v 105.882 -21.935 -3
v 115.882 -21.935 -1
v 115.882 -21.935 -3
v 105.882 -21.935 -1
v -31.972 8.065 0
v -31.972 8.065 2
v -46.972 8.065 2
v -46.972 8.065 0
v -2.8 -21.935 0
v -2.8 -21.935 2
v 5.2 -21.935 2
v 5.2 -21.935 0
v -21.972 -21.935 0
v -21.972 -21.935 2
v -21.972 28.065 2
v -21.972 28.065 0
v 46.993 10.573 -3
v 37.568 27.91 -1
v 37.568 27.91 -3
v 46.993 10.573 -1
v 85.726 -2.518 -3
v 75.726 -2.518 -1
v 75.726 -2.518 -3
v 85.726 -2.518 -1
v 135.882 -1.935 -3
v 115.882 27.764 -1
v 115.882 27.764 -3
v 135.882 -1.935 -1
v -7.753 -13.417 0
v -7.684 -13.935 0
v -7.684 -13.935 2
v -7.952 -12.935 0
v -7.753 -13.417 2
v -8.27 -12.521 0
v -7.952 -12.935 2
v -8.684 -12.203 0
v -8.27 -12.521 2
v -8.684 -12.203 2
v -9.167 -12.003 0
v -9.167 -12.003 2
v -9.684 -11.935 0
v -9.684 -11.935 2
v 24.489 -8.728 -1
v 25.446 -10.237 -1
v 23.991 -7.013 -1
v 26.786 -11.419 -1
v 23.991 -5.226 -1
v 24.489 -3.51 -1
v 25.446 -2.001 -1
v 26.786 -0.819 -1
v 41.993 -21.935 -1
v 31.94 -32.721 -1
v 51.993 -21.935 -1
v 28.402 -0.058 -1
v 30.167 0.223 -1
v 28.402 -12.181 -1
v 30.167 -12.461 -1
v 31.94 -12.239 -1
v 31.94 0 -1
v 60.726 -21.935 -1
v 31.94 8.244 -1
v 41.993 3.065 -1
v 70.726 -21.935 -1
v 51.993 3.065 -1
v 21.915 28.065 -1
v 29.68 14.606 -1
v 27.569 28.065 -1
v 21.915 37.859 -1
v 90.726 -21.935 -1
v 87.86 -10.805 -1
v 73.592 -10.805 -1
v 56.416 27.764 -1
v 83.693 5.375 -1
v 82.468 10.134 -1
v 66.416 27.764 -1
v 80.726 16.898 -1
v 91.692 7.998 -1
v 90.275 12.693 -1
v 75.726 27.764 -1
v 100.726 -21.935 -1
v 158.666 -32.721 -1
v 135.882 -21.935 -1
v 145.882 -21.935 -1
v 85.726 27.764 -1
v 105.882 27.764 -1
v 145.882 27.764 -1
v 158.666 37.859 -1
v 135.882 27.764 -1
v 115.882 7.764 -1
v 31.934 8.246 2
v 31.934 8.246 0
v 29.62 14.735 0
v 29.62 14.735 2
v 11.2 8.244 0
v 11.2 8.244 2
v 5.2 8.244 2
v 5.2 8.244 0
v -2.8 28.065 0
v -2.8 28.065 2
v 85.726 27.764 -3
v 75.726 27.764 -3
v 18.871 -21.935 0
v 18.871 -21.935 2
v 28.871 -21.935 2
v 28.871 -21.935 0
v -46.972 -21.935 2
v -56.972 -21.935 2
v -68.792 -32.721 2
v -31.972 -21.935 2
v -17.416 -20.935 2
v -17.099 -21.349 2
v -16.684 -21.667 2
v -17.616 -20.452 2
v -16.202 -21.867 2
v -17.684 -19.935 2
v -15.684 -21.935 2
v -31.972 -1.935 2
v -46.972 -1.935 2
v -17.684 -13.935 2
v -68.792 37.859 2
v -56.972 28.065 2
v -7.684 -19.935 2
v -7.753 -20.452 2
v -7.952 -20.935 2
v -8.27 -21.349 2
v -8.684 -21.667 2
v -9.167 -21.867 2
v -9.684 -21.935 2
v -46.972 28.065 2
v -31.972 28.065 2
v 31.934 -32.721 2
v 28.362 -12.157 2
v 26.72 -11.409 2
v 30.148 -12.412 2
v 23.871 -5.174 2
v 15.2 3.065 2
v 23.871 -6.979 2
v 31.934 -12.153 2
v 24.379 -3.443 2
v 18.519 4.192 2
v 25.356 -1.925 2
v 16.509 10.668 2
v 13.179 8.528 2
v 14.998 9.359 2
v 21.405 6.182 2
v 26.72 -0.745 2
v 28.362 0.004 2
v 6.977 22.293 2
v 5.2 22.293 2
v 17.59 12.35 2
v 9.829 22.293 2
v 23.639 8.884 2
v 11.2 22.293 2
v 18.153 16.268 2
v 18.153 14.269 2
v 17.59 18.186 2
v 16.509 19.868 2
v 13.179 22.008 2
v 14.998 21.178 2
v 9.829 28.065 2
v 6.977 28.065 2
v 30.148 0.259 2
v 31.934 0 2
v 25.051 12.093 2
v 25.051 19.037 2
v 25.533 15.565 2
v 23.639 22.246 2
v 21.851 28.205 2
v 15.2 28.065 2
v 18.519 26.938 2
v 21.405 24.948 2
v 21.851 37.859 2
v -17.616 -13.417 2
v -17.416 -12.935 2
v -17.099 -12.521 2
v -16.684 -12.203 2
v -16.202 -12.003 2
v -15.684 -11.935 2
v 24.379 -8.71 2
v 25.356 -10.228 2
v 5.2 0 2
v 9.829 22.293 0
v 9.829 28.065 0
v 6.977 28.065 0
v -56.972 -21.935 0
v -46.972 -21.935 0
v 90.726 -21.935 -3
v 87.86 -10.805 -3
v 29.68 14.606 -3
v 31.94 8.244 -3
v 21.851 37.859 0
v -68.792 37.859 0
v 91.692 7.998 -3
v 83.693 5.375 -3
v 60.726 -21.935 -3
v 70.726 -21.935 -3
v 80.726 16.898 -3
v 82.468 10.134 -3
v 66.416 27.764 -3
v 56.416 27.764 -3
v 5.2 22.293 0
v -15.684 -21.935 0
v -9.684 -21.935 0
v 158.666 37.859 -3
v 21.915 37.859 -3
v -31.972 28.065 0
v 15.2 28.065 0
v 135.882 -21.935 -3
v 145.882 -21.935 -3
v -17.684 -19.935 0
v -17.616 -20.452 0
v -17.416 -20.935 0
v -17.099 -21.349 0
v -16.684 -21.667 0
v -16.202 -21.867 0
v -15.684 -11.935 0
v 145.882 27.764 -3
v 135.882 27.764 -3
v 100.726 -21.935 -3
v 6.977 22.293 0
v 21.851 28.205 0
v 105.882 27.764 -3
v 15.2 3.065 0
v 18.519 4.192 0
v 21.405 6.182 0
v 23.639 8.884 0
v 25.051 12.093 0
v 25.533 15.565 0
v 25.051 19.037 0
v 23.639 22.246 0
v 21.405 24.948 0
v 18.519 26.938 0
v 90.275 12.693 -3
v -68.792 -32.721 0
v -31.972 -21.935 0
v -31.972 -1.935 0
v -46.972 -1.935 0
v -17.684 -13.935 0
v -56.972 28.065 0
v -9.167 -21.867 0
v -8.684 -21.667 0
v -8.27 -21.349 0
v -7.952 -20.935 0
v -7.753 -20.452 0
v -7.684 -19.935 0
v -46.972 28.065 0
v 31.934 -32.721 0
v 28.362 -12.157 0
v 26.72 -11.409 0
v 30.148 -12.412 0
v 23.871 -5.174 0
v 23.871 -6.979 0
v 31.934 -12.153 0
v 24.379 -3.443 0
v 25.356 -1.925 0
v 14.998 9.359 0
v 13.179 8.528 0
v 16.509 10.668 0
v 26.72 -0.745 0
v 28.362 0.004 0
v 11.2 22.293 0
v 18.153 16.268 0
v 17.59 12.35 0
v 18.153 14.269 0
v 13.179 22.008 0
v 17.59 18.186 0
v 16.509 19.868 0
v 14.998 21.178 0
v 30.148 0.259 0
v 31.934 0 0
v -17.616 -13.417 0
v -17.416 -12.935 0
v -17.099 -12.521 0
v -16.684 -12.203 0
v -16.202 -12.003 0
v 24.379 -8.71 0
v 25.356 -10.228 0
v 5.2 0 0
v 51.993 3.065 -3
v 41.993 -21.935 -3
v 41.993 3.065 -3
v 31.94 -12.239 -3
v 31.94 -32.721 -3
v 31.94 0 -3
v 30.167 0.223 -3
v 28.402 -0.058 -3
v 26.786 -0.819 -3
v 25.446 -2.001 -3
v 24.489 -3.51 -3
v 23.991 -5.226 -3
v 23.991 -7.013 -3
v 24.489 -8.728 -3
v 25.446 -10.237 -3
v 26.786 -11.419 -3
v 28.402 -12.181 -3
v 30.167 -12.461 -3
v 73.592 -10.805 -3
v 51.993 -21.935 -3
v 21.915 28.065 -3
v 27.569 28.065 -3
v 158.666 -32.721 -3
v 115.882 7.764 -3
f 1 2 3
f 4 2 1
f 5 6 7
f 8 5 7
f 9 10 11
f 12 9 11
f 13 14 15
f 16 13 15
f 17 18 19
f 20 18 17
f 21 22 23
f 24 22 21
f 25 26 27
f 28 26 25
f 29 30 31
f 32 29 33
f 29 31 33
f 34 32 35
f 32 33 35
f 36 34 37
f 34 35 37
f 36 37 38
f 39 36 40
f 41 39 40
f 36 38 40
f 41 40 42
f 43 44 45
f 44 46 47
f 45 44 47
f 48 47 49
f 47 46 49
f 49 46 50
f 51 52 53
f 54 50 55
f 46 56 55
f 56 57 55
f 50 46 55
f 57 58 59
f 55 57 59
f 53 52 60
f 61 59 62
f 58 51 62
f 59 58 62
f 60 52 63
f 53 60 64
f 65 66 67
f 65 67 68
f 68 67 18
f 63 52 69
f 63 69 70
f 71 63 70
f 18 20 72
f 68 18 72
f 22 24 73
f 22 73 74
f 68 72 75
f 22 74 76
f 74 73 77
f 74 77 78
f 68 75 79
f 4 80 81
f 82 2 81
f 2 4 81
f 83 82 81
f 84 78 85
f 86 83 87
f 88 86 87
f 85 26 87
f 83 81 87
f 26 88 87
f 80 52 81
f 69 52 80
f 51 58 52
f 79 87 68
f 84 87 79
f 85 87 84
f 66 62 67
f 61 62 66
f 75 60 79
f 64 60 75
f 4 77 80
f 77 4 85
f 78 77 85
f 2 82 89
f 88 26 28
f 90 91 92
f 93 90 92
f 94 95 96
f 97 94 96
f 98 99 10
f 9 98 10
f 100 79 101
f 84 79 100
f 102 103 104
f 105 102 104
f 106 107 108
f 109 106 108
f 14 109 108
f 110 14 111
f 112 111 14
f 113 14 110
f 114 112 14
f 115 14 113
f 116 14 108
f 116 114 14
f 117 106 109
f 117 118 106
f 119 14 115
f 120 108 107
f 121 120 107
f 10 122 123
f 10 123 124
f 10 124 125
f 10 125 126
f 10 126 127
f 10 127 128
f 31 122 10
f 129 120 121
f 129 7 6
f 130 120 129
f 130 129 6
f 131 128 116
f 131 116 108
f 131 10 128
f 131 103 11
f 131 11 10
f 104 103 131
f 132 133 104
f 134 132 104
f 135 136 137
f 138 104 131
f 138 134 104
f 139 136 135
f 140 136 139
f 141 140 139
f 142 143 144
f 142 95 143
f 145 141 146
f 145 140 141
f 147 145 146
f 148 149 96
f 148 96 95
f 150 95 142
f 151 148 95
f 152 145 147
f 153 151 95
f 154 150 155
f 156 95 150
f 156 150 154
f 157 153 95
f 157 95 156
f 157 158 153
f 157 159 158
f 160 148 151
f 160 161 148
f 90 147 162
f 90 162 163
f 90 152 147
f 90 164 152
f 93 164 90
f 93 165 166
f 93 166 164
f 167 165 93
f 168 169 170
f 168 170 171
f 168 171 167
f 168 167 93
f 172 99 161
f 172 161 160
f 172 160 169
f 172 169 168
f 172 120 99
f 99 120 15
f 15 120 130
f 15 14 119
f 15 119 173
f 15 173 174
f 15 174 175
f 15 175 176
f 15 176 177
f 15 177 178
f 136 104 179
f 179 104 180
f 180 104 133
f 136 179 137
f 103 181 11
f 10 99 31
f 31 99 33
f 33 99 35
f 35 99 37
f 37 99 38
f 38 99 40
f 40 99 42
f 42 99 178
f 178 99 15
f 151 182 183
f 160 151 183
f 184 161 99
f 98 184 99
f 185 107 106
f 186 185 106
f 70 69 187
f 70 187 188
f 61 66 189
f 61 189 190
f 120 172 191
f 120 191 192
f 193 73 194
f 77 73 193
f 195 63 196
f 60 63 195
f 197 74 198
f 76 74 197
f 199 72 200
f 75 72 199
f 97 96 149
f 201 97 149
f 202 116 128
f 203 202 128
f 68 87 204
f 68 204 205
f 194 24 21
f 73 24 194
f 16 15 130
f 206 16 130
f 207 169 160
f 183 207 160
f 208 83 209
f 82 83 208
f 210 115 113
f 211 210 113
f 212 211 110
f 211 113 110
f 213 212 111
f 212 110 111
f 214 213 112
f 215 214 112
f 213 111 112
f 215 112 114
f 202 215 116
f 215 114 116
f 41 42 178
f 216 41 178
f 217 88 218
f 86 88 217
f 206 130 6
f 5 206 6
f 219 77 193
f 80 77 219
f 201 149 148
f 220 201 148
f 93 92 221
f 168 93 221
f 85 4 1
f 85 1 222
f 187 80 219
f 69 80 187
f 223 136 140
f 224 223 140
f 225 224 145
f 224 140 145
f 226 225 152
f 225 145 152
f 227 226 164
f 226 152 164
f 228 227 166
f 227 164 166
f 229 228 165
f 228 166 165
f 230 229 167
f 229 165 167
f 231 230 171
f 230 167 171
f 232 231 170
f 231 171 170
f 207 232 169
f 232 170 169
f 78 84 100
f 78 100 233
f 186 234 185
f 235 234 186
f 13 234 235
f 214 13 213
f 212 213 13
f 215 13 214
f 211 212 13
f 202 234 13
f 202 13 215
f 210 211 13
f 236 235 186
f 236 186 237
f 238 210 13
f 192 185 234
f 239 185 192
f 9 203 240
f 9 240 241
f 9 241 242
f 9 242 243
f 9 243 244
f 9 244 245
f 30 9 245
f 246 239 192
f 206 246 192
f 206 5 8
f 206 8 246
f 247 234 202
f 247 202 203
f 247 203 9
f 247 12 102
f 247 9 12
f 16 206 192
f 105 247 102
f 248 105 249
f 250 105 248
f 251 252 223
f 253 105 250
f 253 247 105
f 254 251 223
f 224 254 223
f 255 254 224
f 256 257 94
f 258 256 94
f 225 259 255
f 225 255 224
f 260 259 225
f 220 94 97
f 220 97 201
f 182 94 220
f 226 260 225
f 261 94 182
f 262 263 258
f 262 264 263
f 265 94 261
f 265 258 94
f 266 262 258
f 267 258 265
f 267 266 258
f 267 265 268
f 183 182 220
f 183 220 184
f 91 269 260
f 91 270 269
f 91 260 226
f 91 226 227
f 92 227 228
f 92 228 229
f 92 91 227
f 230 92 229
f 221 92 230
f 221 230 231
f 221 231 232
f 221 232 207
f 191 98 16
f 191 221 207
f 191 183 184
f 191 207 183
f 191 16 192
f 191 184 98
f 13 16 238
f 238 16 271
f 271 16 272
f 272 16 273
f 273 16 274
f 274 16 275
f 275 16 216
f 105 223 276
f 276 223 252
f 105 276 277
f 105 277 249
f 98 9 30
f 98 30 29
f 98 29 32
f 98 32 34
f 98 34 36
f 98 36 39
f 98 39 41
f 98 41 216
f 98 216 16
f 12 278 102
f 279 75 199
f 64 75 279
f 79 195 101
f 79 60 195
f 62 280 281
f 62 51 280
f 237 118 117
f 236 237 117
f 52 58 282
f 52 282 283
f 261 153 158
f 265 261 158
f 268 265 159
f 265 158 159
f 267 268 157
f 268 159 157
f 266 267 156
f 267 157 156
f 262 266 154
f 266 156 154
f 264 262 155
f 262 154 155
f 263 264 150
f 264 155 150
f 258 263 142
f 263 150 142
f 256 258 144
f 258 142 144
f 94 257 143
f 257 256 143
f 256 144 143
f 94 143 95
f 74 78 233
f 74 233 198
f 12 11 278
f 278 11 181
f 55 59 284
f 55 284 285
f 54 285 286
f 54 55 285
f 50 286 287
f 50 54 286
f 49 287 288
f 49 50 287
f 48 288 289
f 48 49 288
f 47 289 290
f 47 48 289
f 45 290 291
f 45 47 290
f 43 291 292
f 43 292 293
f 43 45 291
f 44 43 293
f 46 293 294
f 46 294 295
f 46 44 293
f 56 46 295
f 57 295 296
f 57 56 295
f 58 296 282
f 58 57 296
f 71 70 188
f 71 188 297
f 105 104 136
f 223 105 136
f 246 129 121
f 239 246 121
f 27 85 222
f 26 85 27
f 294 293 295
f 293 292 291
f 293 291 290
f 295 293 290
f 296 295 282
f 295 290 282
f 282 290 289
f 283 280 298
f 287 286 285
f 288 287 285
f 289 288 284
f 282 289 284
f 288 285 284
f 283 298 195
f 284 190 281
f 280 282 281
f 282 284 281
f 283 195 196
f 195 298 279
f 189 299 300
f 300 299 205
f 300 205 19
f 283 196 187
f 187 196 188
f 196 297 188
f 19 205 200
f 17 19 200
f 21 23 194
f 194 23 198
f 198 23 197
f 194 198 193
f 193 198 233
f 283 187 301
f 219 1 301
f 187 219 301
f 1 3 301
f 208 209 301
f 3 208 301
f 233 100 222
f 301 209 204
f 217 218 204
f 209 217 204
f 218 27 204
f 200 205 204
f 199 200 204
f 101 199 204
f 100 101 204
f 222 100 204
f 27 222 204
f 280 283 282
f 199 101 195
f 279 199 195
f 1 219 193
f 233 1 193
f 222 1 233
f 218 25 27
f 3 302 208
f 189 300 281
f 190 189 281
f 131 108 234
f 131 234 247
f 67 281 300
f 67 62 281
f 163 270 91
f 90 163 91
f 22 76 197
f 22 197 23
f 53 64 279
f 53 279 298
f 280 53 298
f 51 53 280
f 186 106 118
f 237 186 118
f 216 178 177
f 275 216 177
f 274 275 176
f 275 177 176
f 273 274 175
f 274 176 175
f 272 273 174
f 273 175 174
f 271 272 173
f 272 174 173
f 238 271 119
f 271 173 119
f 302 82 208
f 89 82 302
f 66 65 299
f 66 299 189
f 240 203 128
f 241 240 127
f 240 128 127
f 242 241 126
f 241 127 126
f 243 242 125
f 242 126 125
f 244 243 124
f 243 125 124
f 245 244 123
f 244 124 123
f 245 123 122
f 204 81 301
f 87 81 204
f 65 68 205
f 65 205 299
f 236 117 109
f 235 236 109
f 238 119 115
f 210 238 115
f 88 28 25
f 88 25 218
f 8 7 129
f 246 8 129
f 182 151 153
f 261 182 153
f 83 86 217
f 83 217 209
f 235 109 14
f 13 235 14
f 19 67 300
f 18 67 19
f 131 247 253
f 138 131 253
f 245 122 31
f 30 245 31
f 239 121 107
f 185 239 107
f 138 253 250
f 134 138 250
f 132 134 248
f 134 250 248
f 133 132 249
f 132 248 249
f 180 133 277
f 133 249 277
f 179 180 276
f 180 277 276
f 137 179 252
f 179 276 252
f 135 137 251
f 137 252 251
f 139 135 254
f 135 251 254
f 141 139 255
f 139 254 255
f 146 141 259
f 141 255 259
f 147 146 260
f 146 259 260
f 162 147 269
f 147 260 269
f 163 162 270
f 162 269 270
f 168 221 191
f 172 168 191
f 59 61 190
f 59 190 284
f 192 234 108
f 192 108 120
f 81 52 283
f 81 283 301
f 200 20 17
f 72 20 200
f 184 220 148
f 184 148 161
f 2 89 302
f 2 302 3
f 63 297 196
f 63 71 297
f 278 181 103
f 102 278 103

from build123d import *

# Parameters (mm, degrees)
F1_DEPTH  = 25
F4_W      = 227.4575755
F4_H      = 70.5800577998
F5_DEPTH  = 20
F6_DEPTH  = 60.1
F7_W      = 2.8521483764
F7_H      = 8.2712303847
F8_DEPTH  = 20
F9_DEPTH  = 18
F11_DEPTH = 5
F12_W     = 70.5800577998
F12_H     = 1
F13_DEPTH = 150.9
F15_DEPTH = 25


with BuildPart() as f1:
    # F0 (on Top) → F1 (new body)
    with BuildSketch(Plane.XY):
        Polygon((-46.9723631442, 28.0651573092), (-56.9723631442, 28.0651573092), (-56.9723631442, -21.9348426908), (-46.9723631442, -21.9348426908), (-46.9723631442, -1.9348426908), (-31.9723631442, -1.9348426908), (-31.9723631442, -21.9348426908), (-21.9723631442, -21.9348426908), (-21.9723631442, 28.0651573092), (-31.9723631442, 28.0651573092), (-31.9723631442, 8.0651573092), (-46.9723631442, 8.0651573092), align=None)
    extrude(amount=F1_DEPTH)



with BuildPart() as f1b:
    # F0 (on Top) → F1, piece 2 (new body)
    with BuildSketch(Plane.XY):
        with BuildLine():
            Line((10, 28.0651573092), (0, 28.0651573092))
            Line((0, 28.0651573092), (0, -21.9348426908))
            Line((0, -21.9348426908), (8, -21.9348426908))
            Line((8, -21.9348426908), (8, 0))
            Line((8, 0), (21.6713771224, -21.9348426908))
            Line((21.6713771224, -21.9348426908), (31.6713771224, -21.9348426908))
            Line((31.6713771224, -21.9348426908), (18, 3.0651573092))
            ThreePointArc((18, 3.0651573092), (28.3333292247, 15.5651573092), (18, 28.0651573092))
            Line((18, 28.0651573092), (10, 28.0651573092))
        make_face()
        with BuildLine():
            Line((14, 8.2439472899), (8, 8.2439472899))
            Line((8, 8.2439472899), (8, 22.2926959395))
            Line((8, 22.2926959395), (14, 22.2926959395))
            ThreePointArc((14, 22.2926959395), (21.0243743248, 15.2683216147), (14, 8.2439472899))
        make_face(mode=Mode.SUBTRACT)
    extrude(amount=F1_DEPTH)


with BuildPart() as f1c:
    # F0 (on Top) → F1, piece 3 (new body)
    with BuildSketch(Plane.XY):
        with BuildLine():
            ThreePointArc((-17.6843942031, -19.9348426908), (-17.0986077655, -21.3490562532), (-15.6843942031, -21.9348426908))
            Line((-15.6843942031, -21.9348426908), (-9.6843942031, -21.9348426908))
            ThreePointArc((-9.6843942031, -21.9348426908), (-8.2701806408, -21.3490562532), (-7.6843942031, -19.9348426908))
            Line((-7.6843942031, -19.9348426908), (-7.6843942031, -13.9348426908))
            ThreePointArc((-7.6843942031, -13.9348426908), (-8.2701806408, -12.5206291285), (-9.6843942031, -11.9348426908))
            Line((-9.6843942031, -11.9348426908), (-15.6843942031, -11.9348426908))
            ThreePointArc((-15.6843942031, -11.9348426908), (-17.0986077655, -12.5206291285), (-17.6843942031, -13.9348426908))
            Line((-17.6843942031, -13.9348426908), (-17.6843942031, -19.9348426908))
        make_face()
    extrude(amount=F1_DEPTH)


with BuildPart() as f1d:
    # F0 (on Top) → F1, piece 4 (new body)
    with BuildSketch(Plane.XY):
        Polygon((44.7931885719, 3.0651573092), (44.7931885719, -21.9348426908), (54.7931885719, -21.9348426908), (54.7931885719, 3.0651573092), (69.2160581468, 27.764311542), (59.2160581468, 27.764311542), (49.7931885719, 10.5728954077), (40.3677413874, 27.9102737799), (30.3689409047, 28.0651573092), align=None)
    extrude(amount=F1_DEPTH)


with BuildPart() as f1e:
    # F0 (on Top) → F1, piece 5 (new body)
    with BuildSketch(Plane.XY):
        Polygon((86.8261525035, 27.764311542), (71.8261525035, -21.9348426908), (81.8261525035, -21.9348426908), (84.6922499531, -10.8048464541), (98.9600550539, -10.8048464541), (101.8261525035, -21.9348426908), (111.8261525035, -21.9348426908), (96.8261525035, 27.764311542), (91.8261525035, 27.764311542), align=None)
        Polygon((86.8261525035, -2.5182031095), (91.8261525035, 16.8984364718), (96.8261525035, -2.5182031095), align=None, mode=Mode.SUBTRACT)
    extrude(amount=F1_DEPTH)


with BuildPart() as f1f:
    # F0 (on Top) → F1, piece 6 (new body)
    with BuildSketch(Plane.XY):
        Polygon((116.9819906354, 27.764311542), (116.9819906354, -21.9348426908), (126.9819906354, -21.9348426908), (126.9819906354, 7.764311542), (146.9819906354, -21.9348426908), (156.9819906354, -21.9348426908), (156.9819906354, 27.764311542), (146.9819906354, 27.764311542), (146.9819906354, -1.9348426908), (126.9819906354, 27.764311542), align=None)
    extrude(amount=F1_DEPTH)


with BuildPart() as f1e_1:
    # F2: moved
    add(f1e.part.moved(Location((-8.3, 0, 0))))


with BuildPart() as f1f_1:
    # F2: moved
    add(f1f.part.moved(Location((-8.3, 0, 0))))


with BuildPart() as f1d_1:
    # F3: moved
    add(f1d.part.moved(Location((-2.8, 0, 0))))


with BuildPart() as f1e_2:
    # F3: moved
    add(f1e_1.part.moved(Location((-2.8, 0, 0))))


with BuildPart() as f1f_2:
    # F3: moved
    add(f1f_1.part.moved(Location((-2.8, 0, 0))))


with BuildPart() as f1b_1:
    # F3: moved
    add(f1b.part.moved(Location((-2.8, 0, 0))))


with BuildPart() as f1_1:
    add(f1.part)

    add(f1b_1.part)  # F5 merges F1b

    add(f1c.part)  # F5 merges F1c

    add(f1d_1.part)  # F5 merges F1d

    add(f1e_2.part)  # F5 merges F1e

    add(f1f_2.part)  # F5 merges F1f
    # F4 (on Top) → F5 (join)
    with BuildSketch(Plane.XY):
        with Locations((44.937197119, 2.5689788163)):
            Rectangle(F4_W, F4_H)
    extrude(amount=F5_DEPTH)

    # F6 (cut): faces of the model
    f6_faces = [f1_1.faces().sort_by_distance(p)[0] for p in [
        (-39.4723631442, 3.0651573092, 25),
        (-12.6843942031, -16.9348426908, 25),
        (9.9555053028, 3.3304867819, 25),
        (46.9841841079, 7.0402084127, 25),
        (68.8369069767, 2.7303989527, 25),
        (125.8819906354, 2.9147344256, 25),
    ]]
    extrude(f6_faces, amount=-F6_DEPTH, mode=Mode.SUBTRACT)

    # F7 (on Top) → F8 (join)
    with BuildSketch(Plane.XY):
        with Locations((8.402756881, 25.4406826571)):
            Rectangle(F7_W, F7_H)
        Polygon((92.340439558, 13.3704673499), (81.9505527616, 9.963946417), (82.3234398778, 4.9261620448), (93.8680427637, 8.7112784915), align=None)
    extrude(amount=F8_DEPTH)

    # F9 (cut): a face of the model
    f9_faces = [f1_1.faces().sort_by_distance(p)[0] for p in [
        (44.937197119, 35.4774432469, 20),
    ]]
    extrude(f9_faces, amount=-F9_DEPTH, mode=Mode.SUBTRACT)

    # F10 (on face) → F11 (join)
    with BuildSketch(Plane.XY.offset(2)):
        with BuildLine():
            Line((158.665984869, 37.8590077162), (21.9146478921, 37.8590077162))
            Line((21.9146478921, 37.8590077162), (21.9146478921, 28.0651573092))
            Line((21.9146478921, 28.0651573092), (29.6798946739, 14.6064886823))
            Line((29.6798946739, 14.6064886823), (31.9397747517, 8.2439472899))
            Line((31.9397747517, 8.2439472899), (31.9397747517, 0))
            ThreePointArc((31.9397747517, 0), (23.9279042936, -6.1192756984), (31.9397747517, -12.2385513969))
            Line((31.9397747517, -12.2385513969), (31.9397747517, -32.7210500836))
            Line((31.9397747517, -32.7210500836), (158.665984869, -32.7210500836))
            Line((158.665984869, -32.7210500836), (158.665984869, 37.8590077162))
        make_face()
        Polygon((41.9931885719, -21.9348426908), (41.9931885719, 3.0651573092), (27.5689409047, 28.0651573092), (37.5677413874, 27.9102737799), (46.9931885719, 10.5728954077), (56.4160581468, 27.764311542), (66.4160581468, 27.764311542), (51.9931885719, 3.0651573092), (51.9931885719, -21.9348426908), align=None, mode=Mode.SUBTRACT)
        Polygon((70.7261525035, -21.9348426908), (60.7261525035, -21.9348426908), (75.7261525035, 27.764311542), (85.7261525035, 27.764311542), (90.2748478691, 12.6932240396), (82.4681591424, 10.1336534606), (80.7261525035, 16.8984364718), (75.7261525035, -2.5182031095), (85.7261525035, -2.5182031095), (83.6934740995, 5.3753536815), (91.6919958377, 7.9978203423), (100.7261525035, -21.9348426908), (90.7261525035, -21.9348426908), (87.8600550539, -10.8048464541), (73.5922499531, -10.8048464541), align=None, mode=Mode.SUBTRACT)
        Polygon((105.8819906354, -21.9348426908), (105.8819906354, 27.764311542), (115.8819906354, 27.764311542), (135.8819906354, -1.9348426908), (135.8819906354, 27.764311542), (145.8819906354, 27.764311542), (145.8819906354, -21.9348426908), (135.8819906354, -21.9348426908), (115.8819906354, 7.764311542), (115.8819906354, -21.9348426908), align=None, mode=Mode.SUBTRACT)
    extrude(amount=-F11_DEPTH)

    # F12 (on face) → F13 (cut)
    with BuildSketch(Plane.YZ.offset(158.665984869)):
        with Locations((2.5689788163, -0.5)):
            Rectangle(F12_W, F12_H)
    extrude(amount=-F13_DEPTH, mode=Mode.SUBTRACT)

    # F14 (on face) → F15 (cut)
    with BuildSketch(Plane(origin=(0, 0, 0), x_dir=(1, 0, 0), z_dir=(0, 0, -1))):
        with BuildLine():
            Line((21.8506939709, -28.2046720386), (21.8506939709, -37.8590077162))
            Line((21.8506939709, -37.8590077162), (158.665984869, -37.8590077162))
            Line((158.665984869, -37.8590077162), (158.665984869, 32.7210500836))
            Line((158.665984869, 32.7210500836), (31.9340899587, 32.7210500836))
            Line((31.9340899587, 32.7210500836), (31.9340899587, 12.1531756595))
            ThreePointArc((31.9340899587, 12.1531756595), (23.8061123839, 6.0765878297), (31.9340899587, 0))
            Line((31.9340899587, 0), (31.9340899587, -8.246445097))
            Line((31.9340899587, -8.246445097), (29.6203736216, -14.7349052131))
            Line((29.6203736216, -14.7349052131), (21.8506939709, -28.2046720386))
        make_face()
        Polygon((41.9931885719, -3.0651573092), (41.9931885719, 21.9348426908), (51.9931885719, 21.9348426908), (51.9931885719, -3.0651573092), (66.4160581468, -27.764311542), (56.4160581468, -27.764311542), (46.9931885719, -10.5728954077), (37.5677413874, -27.9102737799), (27.5689409047, -28.0651573092), align=None, mode=Mode.SUBTRACT)
        Polygon((60.7261525035, 21.9348426908), (70.7261525035, 21.9348426908), (73.5922499531, 10.8048464541), (87.8600550539, 10.8048464541), (90.7261525035, 21.9348426908), (100.7261525035, 21.9348426908), (91.6919958377, -7.9978203423), (83.6934740995, -5.3753536815), (85.7261525035, 2.5182031095), (75.7261525035, 2.5182031095), (80.7261525035, -16.8984364718), (82.4681591424, -10.1336534606), (90.2748478691, -12.6932240396), (85.7261525035, -27.764311542), (75.7261525035, -27.764311542), align=None, mode=Mode.SUBTRACT)
        Polygon((105.8819906354, -27.764311542), (105.8819906354, 21.9348426908), (115.8819906354, 21.9348426908), (115.8819906354, -7.764311542), (135.8819906354, 21.9348426908), (145.8819906354, 21.9348426908), (145.8819906354, -27.764311542), (135.8819906354, -27.764311542), (135.8819906354, 1.9348426908), (115.8819906354, -27.764311542), align=None, mode=Mode.SUBTRACT)
    extrude(amount=-F15_DEPTH, mode=Mode.SUBTRACT)


solid = f1_1.part
